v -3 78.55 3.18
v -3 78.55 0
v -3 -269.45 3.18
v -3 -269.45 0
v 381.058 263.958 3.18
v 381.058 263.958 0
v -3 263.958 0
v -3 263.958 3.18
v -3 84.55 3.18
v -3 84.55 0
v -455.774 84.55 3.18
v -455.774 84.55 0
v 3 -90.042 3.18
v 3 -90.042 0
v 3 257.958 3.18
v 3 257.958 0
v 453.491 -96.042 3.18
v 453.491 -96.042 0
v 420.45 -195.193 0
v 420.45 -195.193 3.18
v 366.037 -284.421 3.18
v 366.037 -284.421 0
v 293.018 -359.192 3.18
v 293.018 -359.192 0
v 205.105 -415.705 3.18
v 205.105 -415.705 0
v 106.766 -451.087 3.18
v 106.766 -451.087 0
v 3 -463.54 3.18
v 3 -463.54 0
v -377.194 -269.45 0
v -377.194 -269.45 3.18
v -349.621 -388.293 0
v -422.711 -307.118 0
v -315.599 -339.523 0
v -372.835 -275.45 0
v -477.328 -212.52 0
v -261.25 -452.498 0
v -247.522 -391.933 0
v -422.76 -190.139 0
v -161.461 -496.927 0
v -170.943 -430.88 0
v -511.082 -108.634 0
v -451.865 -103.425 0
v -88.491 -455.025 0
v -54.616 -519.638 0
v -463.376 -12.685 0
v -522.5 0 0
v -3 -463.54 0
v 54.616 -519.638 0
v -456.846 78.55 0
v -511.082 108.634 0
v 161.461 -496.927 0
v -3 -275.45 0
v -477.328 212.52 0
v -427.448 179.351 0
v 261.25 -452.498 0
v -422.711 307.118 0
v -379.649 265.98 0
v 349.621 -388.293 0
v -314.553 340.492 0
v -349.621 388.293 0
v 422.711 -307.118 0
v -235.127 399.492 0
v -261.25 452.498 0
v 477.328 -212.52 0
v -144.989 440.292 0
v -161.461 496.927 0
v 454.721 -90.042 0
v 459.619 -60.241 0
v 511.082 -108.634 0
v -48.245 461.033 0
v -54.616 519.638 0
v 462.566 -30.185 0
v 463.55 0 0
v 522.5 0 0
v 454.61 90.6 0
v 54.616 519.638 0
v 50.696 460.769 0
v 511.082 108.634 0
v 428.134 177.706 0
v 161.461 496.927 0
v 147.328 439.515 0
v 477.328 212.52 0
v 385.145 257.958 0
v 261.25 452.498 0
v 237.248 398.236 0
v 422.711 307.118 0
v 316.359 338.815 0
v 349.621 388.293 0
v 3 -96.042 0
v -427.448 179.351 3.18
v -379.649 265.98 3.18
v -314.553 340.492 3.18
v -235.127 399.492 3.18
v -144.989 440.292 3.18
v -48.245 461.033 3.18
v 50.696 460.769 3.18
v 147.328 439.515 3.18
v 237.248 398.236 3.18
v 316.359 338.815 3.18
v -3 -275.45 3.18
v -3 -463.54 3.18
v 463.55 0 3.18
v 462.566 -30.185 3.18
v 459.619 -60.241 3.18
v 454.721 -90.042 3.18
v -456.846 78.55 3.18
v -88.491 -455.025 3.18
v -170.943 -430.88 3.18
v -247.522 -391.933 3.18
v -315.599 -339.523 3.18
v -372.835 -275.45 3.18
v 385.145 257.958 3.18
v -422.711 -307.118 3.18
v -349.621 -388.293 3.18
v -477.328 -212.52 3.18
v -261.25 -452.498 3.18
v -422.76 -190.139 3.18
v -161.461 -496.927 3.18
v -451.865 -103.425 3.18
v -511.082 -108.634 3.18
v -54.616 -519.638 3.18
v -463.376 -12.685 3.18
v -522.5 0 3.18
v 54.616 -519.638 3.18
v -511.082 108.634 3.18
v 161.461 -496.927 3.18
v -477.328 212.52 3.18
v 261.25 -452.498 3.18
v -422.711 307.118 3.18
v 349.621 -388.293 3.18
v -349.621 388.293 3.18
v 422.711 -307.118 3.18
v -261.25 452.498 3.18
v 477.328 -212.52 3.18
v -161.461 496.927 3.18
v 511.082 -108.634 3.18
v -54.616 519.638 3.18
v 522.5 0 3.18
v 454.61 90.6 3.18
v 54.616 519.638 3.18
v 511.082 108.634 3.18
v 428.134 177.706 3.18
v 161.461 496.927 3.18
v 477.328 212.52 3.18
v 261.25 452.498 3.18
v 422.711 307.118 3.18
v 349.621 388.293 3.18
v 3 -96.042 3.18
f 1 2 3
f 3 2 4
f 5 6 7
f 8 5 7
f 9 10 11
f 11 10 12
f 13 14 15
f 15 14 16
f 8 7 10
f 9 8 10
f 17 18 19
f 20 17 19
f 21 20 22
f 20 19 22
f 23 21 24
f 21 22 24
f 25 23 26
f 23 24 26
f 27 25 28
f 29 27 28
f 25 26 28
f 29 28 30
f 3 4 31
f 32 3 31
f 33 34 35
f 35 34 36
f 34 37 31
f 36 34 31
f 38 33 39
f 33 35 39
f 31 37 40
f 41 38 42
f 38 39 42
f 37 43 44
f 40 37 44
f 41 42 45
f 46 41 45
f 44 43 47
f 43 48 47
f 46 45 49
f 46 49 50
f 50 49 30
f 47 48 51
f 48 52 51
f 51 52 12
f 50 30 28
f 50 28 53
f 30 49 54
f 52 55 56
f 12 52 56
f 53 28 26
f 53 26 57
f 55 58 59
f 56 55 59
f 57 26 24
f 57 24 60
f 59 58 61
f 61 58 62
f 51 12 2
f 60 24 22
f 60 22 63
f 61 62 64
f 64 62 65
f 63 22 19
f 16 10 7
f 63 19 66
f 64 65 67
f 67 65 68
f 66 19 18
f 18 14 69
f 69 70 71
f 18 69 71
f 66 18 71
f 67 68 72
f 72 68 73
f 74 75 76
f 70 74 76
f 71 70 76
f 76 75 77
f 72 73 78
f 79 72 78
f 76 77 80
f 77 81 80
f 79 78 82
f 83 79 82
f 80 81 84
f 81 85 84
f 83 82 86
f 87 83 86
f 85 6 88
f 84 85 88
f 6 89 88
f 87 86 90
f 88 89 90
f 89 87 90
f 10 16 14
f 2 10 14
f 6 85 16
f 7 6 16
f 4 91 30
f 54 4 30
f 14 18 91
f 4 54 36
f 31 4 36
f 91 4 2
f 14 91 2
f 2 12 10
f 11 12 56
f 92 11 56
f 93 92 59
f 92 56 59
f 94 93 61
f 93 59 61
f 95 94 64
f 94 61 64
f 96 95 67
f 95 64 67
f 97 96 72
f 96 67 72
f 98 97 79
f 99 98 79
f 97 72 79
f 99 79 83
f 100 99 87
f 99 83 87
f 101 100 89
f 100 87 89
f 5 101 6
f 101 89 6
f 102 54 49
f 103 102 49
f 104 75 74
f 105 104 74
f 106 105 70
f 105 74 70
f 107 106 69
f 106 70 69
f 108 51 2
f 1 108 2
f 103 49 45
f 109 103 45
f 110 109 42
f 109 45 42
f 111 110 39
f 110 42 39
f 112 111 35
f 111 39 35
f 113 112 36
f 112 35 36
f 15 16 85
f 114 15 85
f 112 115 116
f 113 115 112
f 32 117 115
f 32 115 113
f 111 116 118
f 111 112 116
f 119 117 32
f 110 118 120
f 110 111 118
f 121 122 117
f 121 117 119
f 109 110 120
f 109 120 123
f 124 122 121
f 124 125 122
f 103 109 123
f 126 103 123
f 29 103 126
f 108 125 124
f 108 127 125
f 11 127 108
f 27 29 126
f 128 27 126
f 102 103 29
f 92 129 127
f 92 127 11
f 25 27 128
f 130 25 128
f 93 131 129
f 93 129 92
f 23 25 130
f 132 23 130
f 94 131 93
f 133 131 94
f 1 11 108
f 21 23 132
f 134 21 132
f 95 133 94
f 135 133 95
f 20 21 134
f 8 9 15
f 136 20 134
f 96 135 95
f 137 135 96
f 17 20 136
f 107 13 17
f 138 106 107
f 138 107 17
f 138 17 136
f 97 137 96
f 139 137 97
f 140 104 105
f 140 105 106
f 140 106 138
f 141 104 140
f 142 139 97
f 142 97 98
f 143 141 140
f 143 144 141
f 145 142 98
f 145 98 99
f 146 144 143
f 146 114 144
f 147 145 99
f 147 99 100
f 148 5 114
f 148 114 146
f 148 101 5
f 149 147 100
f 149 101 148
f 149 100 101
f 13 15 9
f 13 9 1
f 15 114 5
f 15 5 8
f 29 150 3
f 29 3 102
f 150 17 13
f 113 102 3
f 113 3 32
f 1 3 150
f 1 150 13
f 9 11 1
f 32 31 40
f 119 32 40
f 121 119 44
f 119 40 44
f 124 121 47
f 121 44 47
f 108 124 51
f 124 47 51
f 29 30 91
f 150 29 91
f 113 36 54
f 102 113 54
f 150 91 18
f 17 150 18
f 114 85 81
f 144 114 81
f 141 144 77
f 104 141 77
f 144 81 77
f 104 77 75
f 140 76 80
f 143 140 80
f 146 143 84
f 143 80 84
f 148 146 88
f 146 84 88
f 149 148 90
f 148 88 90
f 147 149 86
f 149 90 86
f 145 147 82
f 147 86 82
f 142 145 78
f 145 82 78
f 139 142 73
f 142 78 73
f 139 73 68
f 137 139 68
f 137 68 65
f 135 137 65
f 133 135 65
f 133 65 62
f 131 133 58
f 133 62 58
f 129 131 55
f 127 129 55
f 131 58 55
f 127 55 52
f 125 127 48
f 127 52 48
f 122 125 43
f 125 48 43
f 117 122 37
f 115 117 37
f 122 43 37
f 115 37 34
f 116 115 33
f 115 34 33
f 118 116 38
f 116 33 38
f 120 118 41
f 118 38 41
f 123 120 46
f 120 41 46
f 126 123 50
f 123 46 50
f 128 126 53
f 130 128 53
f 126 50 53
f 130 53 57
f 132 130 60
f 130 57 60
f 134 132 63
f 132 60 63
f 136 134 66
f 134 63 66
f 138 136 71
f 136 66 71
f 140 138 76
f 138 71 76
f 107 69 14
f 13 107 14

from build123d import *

# Parameters (mm, degrees)
F0_R     = 522.5
F1_DEPTH = 3.18


with BuildPart() as f1:
    # F0 (on Top) → F1 (new body)
    with BuildSketch(Plane.XY):
        Circle(F0_R)
        with BuildLine():
            ThreePointArc((385.144778, 257.95756), (443.515763, 134.804935), (463.55, 0))
            ThreePointArc((463.55, 0), (461.337407, -45.237144), (454.720751, -90.04244))
            ThreePointArc((454.720751, -90.04244), (454.115986, -93.04447), (453.491403, -96.04244))
            ThreePointArc((453.491403, -96.04244), (293.018375, -359.191919), (3, -463.540292))
            ThreePointArc((3, -463.540292), (0, -463.55), (-3, -463.540292))
            ThreePointArc((-3, -463.540292), (-210.136781, -413.184142), (-372.83495, -275.45))
            ThreePointArc((-372.83495, -275.45), (-375.026465, -272.458718), (-377.193982, -269.45))
            ThreePointArc((-377.193982, -269.45), (-451.864779, -103.42545), (-456.846254, 78.55))
            ThreePointArc((-456.846254, 78.55), (-456.319967, 81.551762), (-455.773957, 84.55))
            ThreePointArc((-455.773957, 84.55), (-97.171992, 453.25071), (381.05775, 263.95756))
            ThreePointArc((381.05775, 263.95756), (383.11301, 260.965561), (385.144778, 257.95756))
        make_face(mode=Mode.SUBTRACT)
        with BuildLine():
            Line((-3, 84.55), (-455.773957, 84.55))
            ThreePointArc((-455.773957, 84.55), (-456.319967, 81.551762), (-456.846254, 78.55))
            Line((-456.846254, 78.55), (-3, 78.55))
            Line((-3, 78.55), (-3, 84.55))
        make_face()
        with BuildLine():
            Line((3, 257.95756), (385.144778, 257.95756))
            ThreePointArc((385.144778, 257.95756), (383.11301, 260.965561), (381.05775, 263.95756))
            Line((381.05775, 263.95756), (-3, 263.95756))
            Line((-3, 263.95756), (-3, 84.55))
            Line((-3, 84.55), (-3, 78.55))
            Line((-3, 78.55), (-3, -269.45))
            Line((-3, -269.45), (-3, -275.45))
            Line((-3, -275.45), (-3, -463.540292))
            ThreePointArc((-3, -463.540292), (0, -463.55), (3, -463.540292))
            Line((3, -463.540292), (3, -96.04244))
            Line((3, -96.04244), (3, -90.04244))
            Line((3, -90.04244), (3, 257.95756))
        make_face()
        with BuildLine():
            ThreePointArc((453.491403, -96.04244), (454.115986, -93.04447), (454.720751, -90.04244))
            Line((454.720751, -90.04244), (3, -90.04244))
            Line((3, -90.04244), (3, -96.04244))
            Line((3, -96.04244), (453.491403, -96.04244))
        make_face()
        with BuildLine():
            Line((-3, -269.45), (-377.193982, -269.45))
            ThreePointArc((-377.193982, -269.45), (-375.026465, -272.458718), (-372.83495, -275.45))
            Line((-372.83495, -275.45), (-3, -275.45))
            Line((-3, -275.45), (-3, -269.45))
        make_face()
    extrude(amount=F1_DEPTH)


solid = f1.part
